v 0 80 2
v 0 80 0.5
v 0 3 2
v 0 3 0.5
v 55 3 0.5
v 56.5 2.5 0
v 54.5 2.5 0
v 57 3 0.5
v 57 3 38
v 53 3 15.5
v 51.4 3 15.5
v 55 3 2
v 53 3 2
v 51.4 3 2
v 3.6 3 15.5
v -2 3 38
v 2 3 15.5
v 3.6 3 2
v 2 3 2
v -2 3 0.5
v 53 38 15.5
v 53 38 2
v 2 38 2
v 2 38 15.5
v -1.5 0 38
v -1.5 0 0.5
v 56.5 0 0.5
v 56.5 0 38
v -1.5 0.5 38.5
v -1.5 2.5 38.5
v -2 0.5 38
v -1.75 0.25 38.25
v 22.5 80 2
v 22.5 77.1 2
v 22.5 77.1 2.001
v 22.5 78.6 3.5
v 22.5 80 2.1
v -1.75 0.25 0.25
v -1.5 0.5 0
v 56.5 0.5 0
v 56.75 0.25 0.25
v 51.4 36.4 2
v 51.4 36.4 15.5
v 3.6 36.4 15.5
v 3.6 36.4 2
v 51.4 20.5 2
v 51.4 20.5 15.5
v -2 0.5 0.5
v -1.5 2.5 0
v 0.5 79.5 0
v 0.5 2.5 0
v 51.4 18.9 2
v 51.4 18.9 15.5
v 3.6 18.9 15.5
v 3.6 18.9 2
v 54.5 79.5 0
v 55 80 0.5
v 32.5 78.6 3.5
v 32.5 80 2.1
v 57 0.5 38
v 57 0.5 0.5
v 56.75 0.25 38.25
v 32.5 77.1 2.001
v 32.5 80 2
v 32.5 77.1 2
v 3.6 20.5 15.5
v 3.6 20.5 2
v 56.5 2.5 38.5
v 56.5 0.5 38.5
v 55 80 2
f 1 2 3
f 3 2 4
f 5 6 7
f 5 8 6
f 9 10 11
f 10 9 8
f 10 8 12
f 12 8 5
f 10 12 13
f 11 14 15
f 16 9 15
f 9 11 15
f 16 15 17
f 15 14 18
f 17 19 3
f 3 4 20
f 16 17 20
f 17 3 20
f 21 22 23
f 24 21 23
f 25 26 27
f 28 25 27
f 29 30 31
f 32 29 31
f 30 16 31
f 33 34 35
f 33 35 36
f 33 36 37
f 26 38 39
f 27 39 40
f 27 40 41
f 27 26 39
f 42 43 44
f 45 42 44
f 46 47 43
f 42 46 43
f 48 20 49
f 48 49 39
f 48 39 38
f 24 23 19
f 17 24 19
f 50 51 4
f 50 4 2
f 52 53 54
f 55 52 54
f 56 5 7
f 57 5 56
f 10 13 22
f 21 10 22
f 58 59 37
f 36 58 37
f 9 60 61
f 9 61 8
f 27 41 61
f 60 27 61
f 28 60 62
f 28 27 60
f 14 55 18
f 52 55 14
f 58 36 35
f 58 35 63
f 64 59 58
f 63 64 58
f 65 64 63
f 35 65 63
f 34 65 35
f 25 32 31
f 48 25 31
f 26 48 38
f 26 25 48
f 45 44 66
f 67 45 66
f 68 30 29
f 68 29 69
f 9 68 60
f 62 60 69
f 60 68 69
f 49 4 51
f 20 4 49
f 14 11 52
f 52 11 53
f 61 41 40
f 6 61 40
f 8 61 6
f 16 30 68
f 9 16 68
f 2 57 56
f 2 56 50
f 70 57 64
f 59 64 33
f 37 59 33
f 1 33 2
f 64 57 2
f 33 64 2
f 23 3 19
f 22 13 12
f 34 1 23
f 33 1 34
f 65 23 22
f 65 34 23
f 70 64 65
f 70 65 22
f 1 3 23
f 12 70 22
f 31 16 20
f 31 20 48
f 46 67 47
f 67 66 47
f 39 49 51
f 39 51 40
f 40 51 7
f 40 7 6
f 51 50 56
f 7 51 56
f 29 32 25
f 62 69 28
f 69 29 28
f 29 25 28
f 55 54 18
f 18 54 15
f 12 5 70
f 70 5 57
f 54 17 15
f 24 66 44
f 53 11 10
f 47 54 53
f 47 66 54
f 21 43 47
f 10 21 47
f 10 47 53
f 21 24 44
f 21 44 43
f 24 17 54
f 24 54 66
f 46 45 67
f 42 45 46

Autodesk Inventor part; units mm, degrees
ref_plane "YZ Plane" through (0, 0, 0) normal (1, 0, 0) x (0, 1, 0)
ref_plane "XZ Plane" through (0, 0, 0) normal (0, 1, 0) x (-1, 0, 0)
ref_plane "XY Plane" through (0, 0, 0) normal (0, 0, 1) x (1, 0, 0)
sketch "Sketch1" plane through (0, 0, 0) normal (0, 0, 1) x (1, 0, 0)
  line L0 (0, 0) -> (55, 0)
  line L1 (55, 0) -> (55, 80)
  line L2 (55, 80) -> (0, 80)
  line L3 (0, 80) -> (0, 0)
  dimension "d0" = 55
  dimension "d1" = 80
extrude "Base" add sketch "Sketch1" along normal blind 2
sketch "Sketch2" plane through (0, 0, 2) normal (0, 0, 1) x (1, 0, 0)
  line L0 (55, 0) -> (55, 80) projected
  line L1 (0, 80) -> (0, 0) projected
  line L2 (-2, 0) -> (57, 0)
  line L3 (57, 0) -> (57, 3)
  line L4 (57, 3) -> (-2, 3)
  line L5 (-2, 3) -> (-2, 0)
  dimension "d4" = 3
  dimension "d5" = 2
  dimension "d6" = 2
extrude "Back" add sketch "Sketch2" along normal blind 36.5 and the other way blind 2
sketch "Sketch6" plane through (0, 0, 2) normal (0, 0, 1) x (1, 0, 0)
  line L0 (0, 80) -> (0, 3) projected
  line L1 (0, 3) -> (55, 3) projected
  line L2 (55, 3) -> (55, 80) projected
  line L3 (2, 3) -> (53, 3)
  line L4 (53, 3) -> (53, 38)
  line L5 (53, 38) -> (2, 38)
  line L6 (2, 38) -> (2, 3)
  point P0 (0, 0)
  dimension "d29" = 35
  dimension "d30" = 2
  dimension "d31" = 2
extrude "Box" add sketch "Sketch6" along normal blind 13.5
chamfer "Chamfer3" distance 0.5 angle 45 8 edges at (0, 41.5, 0) (27.5, 80, 0) (55, 41.5, 0) (-1, 3, 0) (-2, 1.5, 0) (27.5, 0, 0) (57, 1.5, 0) (56, 3, 0)
chamfer "Chamfer4" distance 0.5 angle 45 3 edges at (-2, 0, 19.5) (27.5, 0, 38.5) (57, 0, 19.5)
chamfer "Chamfer5" distance 0.5 angle 45 3 edges at (-2, 1.75, 38.5) (27.5, 3, 38.5) (57, 1.75, 38.5)
sketch "Sketch7" plane through (0, 0, 15.5) normal (0, 0, 1) x (1, 0, 0)
  line L0 (53, 3) -> (2, 3) projected
  line L1 (53, 3) -> (53, 38) projected
  line L2 (53, 38) -> (2, 38) projected
  line L3 (2, 38) -> (2, 3) projected
  line L4 (3.6, 3) -> (51.4, 3)
  line L5 (51.4, 3) -> (51.4, 18.9)
  line L6 (51.4, 18.9) -> (3.6, 18.9)
  line L7 (3.6, 18.9) -> (3.6, 3)
  line L8 (51.4, 36.4) -> (3.6, 36.4)
  line L9 (3.6, 36.4) -> (3.6, 20.5)
  line L10 (3.6, 20.5) -> (51.4, 20.5)
  line L11 (51.4, 20.5) -> (51.4, 36.4)
  point P0 (0, 0)
  dimension "d44" = 1.6
  dimension "d45" = 1.6
  dimension "d46" = 1.6
  dimension "d47" = 1.6
  dimension "d48" = 1.6
  dimension "d49" = 1.6
  dimension "d50" = 15.9
  dimension "d51" = 15.9
extrude "Box inside" cut sketch "Sketch7" against normal blind 13.5 contours L0 L7 L6 L5 | L11 L10 L9 L8
sketch "Sketch8" plane through (0, 0, 2) normal (0, 0, 1) x (1, 0, 0)
  line L0 (55, 3) -> (55, 80) projected
  line L1 (55, 80) -> (0, 80) projected
  line L2 (0, 80) -> (0, 3) projected
  line L3 (22.5, 80) -> (32.5, 80)
  line L4 (32.5, 80) -> (32.5, 77.1)
  line L5 (32.5, 77.1) -> (22.5, 77.1)
  line L6 (22.5, 77.1) -> (22.5, 80)
  point P0 (0, 0)
  dimension "d63" = 22.5
  dimension "d64" = 22.5
  dimension "d65" = 10
  dimension "d66" = 2.9
extrude "Extrusion8" add sketch "Sketch8" along normal blind 1.5
chamfer "Chamfer9" distance 1.5 angle 45 1 edges at (27.5, 77.1, 3.5)
chamfer "Chamfer10" distance 1.4 angle 45 1 edges at (27.5, 80, 3.5)
equation "\"d31\" = d30"
equation "\"d45\" = d44"
equation "\"d46\" = d45"
equation "\"d47\" = d46"
equation "\"d48\" = d44"
equation "\"d49\" = d44"
equation "\"d64\" = d63"
properties part number "BOTTOM"
